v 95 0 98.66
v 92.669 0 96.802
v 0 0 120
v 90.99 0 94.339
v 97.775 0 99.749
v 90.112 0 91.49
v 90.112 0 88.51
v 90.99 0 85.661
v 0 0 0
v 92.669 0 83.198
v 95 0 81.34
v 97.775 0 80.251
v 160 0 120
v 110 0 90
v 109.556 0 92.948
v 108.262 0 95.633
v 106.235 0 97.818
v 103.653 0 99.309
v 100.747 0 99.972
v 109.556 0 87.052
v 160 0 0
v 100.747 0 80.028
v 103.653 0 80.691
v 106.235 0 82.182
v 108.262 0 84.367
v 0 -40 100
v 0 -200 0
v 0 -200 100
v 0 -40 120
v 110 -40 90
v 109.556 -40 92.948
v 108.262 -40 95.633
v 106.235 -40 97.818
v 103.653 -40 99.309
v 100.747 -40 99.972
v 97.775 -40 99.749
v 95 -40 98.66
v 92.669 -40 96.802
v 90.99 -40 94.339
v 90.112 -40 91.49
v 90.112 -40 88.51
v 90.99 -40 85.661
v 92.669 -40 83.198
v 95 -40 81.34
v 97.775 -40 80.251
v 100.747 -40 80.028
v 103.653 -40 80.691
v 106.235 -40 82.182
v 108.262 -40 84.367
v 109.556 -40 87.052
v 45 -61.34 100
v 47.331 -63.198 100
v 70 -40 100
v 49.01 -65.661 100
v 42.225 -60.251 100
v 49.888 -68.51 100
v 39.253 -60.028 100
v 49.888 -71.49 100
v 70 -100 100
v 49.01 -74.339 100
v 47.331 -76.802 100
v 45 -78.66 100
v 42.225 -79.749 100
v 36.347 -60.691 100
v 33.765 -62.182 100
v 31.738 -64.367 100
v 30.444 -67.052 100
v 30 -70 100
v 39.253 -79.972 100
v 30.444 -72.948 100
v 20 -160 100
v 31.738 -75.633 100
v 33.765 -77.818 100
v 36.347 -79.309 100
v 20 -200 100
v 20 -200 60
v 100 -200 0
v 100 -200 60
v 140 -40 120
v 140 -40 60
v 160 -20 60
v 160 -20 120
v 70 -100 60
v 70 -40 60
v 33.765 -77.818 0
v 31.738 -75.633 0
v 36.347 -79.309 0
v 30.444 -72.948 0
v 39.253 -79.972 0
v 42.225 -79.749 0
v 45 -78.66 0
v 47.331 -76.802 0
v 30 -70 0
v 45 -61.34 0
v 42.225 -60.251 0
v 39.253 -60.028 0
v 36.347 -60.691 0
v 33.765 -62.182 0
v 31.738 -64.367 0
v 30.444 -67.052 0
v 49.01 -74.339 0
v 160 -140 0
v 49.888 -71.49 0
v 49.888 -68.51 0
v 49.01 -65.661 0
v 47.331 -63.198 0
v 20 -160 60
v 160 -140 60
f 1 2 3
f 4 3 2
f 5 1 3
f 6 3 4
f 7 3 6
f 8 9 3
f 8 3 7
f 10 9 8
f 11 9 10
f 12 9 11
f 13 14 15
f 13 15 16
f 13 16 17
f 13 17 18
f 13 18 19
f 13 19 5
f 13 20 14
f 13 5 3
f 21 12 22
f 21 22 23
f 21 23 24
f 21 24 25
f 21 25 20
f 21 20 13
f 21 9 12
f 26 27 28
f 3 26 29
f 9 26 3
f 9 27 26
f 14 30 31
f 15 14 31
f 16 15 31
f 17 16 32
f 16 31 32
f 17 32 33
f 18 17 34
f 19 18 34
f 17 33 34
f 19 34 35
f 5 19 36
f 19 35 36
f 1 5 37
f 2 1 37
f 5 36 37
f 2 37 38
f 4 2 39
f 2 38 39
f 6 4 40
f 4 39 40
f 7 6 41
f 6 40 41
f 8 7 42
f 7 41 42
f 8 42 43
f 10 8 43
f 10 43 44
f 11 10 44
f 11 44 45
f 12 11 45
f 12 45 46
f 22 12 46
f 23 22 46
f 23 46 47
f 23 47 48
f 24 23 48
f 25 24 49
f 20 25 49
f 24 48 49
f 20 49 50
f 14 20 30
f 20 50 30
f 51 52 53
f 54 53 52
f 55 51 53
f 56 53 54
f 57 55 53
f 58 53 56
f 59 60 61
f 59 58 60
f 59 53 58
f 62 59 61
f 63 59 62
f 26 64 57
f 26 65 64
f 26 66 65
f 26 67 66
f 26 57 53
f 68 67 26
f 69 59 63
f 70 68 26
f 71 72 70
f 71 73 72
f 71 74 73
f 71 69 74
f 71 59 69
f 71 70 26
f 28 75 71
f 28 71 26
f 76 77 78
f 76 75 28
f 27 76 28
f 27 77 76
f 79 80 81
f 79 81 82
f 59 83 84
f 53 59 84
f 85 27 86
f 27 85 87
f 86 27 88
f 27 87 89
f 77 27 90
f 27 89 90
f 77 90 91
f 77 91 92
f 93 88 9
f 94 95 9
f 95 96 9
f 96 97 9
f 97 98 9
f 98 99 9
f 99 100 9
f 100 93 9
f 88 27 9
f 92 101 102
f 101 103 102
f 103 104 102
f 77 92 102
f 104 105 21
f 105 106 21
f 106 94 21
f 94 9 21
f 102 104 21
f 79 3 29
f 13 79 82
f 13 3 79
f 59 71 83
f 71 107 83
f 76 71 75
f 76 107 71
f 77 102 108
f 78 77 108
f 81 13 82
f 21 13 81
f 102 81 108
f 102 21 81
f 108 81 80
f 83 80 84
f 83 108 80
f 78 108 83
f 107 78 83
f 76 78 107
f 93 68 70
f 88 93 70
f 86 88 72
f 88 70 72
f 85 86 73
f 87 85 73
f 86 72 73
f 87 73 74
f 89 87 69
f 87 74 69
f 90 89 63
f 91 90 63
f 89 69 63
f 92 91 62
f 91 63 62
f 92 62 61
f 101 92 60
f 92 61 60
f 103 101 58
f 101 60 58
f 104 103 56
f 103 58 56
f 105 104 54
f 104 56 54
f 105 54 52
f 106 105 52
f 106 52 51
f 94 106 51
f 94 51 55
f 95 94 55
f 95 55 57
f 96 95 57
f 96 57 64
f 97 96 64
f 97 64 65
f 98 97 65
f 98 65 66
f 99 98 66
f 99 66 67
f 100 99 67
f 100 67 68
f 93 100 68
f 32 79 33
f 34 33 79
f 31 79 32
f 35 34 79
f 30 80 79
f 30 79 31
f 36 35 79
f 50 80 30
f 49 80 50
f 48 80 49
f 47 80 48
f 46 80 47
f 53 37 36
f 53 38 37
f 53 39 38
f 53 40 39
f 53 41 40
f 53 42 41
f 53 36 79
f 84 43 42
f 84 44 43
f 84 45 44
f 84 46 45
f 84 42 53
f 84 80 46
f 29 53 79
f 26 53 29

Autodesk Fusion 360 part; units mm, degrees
sketch "Sketch1" plane through (0, 0, 0) normal (0, 0, 1) x (1, 0, 0)
  line L0 (0, 0) -> (160, 0)
  line L1 (160, 0) -> (160, -200)
  line L2 (160, -200) -> (0, -200)
  line L3 (0, -200) -> (0, 0)
  dimension "d1" = 160
  dimension "d2" = 200
extrude "Extrude1" add sketch "Sketch1" along normal blind 120
chamfer "Chamfer1" distance 60 angle 45 1 edges at (160, -200, 60)
sketch "Sketch2" plane through (0, 0, 120) normal (0, 0, 1) x (-1, 0, 0)
  line L0 (-100, 200) -> (-160, 140)
  line L1 (-160, 140) -> (-160, 0)
  line L2 (-160, 0) -> (0, 0)
  line L3 (0, 0) -> (0, 200)
  line L4 (0, 200) -> (-100, 200)
  line L5 (0, 200) -> (-160, 200)
  line L6 (-160, 200) -> (-160, 40)
  line L7 (-160, 40) -> (0, 40)
  line L8 (0, 40) -> (0, 200)
extrude "Extrude2" cut sketch "Sketch2" along normal mid plane 40 contours L0 L1 L3 L4 L5 L6 L7 L8
sketch "Sketch3" plane through (0, 0, 100) normal (0, 0, 1) x (-1, 0, 0)
  line L0 (0, 40) -> (0, 200)
  line L1 (0, 200) -> (-100, 200)
  line L2 (-100, 200) -> (-160, 140)
  line L3 (-160, 140) -> (-160, 40)
  line L4 (-160, 40) -> (0, 40)
  line L5 (-20, 200) -> (-140, 200)
  line L6 (-140, 200) -> (-140, 160)
  line L7 (-140, 160) -> (-20, 160)
  line L8 (-20, 160) -> (-20, 200)
  line L9 (-70, 40) -> (-160, 40)
  line L10 (-160, 40) -> (-160, 100)
  line L11 (-160, 100) -> (-70, 100)
  line L12 (-70, 100) -> (-70, 40)
  line L13 (-20, 160) -> (-70, 100)
  line L14 (-140, 160) -> (-160, 140)
  line L15 (-160, 100) -> (-160, 140)
extrude "Extrude3" cut sketch "Sketch3" along normal mid plane 80 contours L3 L4 L9 L10 L11 L12 | L1 L2 L5 L7 L8 | L2 L3 L7 L11 L13 L14 L15
chamfer "Chamfer2" distance 20 angle 45 1 edges at (160, -40, 90)
sketch "Sketch4" plane through (0, 0, 100) normal (0, 0, 1) x (-1, 0, 0)
  line L0 (-20, 200) -> (-20, 160)
  line L1 (-20, 160) -> (-70, 100)
  line L2 (-70, 100) -> (-70, 40)
  line L3 (-70, 40) -> (0, 40)
  line L4 (0, 40) -> (0, 200)
  line L5 (0, 200) -> (-20, 200)
  circle A0 centre (-40, 70) radius 10
  dimension "d11" = 20
extrude "Extrude4" cut sketch "Sketch4" along normal blind 0 and the other way blind 100 contours A0
sketch "Sketch5" plane through (0, -40, 0) normal (0, -1, 0) x (1, 0, 0)
  line L0 (140, 60) -> (140, 120)
  line L1 (140, 120) -> (0, 120)
  line L2 (0, 120) -> (0, 100)
  line L3 (0, 100) -> (70, 100)
  line L4 (70, 100) -> (70, 60)
  line L5 (70, 60) -> (140, 60)
  circle A0 centre (100, 90) radius 10
  dimension "d16" = 20
extrude "Extrude5" cut sketch "Sketch5" along normal blind 0 and the other way blind 40 contours A0
